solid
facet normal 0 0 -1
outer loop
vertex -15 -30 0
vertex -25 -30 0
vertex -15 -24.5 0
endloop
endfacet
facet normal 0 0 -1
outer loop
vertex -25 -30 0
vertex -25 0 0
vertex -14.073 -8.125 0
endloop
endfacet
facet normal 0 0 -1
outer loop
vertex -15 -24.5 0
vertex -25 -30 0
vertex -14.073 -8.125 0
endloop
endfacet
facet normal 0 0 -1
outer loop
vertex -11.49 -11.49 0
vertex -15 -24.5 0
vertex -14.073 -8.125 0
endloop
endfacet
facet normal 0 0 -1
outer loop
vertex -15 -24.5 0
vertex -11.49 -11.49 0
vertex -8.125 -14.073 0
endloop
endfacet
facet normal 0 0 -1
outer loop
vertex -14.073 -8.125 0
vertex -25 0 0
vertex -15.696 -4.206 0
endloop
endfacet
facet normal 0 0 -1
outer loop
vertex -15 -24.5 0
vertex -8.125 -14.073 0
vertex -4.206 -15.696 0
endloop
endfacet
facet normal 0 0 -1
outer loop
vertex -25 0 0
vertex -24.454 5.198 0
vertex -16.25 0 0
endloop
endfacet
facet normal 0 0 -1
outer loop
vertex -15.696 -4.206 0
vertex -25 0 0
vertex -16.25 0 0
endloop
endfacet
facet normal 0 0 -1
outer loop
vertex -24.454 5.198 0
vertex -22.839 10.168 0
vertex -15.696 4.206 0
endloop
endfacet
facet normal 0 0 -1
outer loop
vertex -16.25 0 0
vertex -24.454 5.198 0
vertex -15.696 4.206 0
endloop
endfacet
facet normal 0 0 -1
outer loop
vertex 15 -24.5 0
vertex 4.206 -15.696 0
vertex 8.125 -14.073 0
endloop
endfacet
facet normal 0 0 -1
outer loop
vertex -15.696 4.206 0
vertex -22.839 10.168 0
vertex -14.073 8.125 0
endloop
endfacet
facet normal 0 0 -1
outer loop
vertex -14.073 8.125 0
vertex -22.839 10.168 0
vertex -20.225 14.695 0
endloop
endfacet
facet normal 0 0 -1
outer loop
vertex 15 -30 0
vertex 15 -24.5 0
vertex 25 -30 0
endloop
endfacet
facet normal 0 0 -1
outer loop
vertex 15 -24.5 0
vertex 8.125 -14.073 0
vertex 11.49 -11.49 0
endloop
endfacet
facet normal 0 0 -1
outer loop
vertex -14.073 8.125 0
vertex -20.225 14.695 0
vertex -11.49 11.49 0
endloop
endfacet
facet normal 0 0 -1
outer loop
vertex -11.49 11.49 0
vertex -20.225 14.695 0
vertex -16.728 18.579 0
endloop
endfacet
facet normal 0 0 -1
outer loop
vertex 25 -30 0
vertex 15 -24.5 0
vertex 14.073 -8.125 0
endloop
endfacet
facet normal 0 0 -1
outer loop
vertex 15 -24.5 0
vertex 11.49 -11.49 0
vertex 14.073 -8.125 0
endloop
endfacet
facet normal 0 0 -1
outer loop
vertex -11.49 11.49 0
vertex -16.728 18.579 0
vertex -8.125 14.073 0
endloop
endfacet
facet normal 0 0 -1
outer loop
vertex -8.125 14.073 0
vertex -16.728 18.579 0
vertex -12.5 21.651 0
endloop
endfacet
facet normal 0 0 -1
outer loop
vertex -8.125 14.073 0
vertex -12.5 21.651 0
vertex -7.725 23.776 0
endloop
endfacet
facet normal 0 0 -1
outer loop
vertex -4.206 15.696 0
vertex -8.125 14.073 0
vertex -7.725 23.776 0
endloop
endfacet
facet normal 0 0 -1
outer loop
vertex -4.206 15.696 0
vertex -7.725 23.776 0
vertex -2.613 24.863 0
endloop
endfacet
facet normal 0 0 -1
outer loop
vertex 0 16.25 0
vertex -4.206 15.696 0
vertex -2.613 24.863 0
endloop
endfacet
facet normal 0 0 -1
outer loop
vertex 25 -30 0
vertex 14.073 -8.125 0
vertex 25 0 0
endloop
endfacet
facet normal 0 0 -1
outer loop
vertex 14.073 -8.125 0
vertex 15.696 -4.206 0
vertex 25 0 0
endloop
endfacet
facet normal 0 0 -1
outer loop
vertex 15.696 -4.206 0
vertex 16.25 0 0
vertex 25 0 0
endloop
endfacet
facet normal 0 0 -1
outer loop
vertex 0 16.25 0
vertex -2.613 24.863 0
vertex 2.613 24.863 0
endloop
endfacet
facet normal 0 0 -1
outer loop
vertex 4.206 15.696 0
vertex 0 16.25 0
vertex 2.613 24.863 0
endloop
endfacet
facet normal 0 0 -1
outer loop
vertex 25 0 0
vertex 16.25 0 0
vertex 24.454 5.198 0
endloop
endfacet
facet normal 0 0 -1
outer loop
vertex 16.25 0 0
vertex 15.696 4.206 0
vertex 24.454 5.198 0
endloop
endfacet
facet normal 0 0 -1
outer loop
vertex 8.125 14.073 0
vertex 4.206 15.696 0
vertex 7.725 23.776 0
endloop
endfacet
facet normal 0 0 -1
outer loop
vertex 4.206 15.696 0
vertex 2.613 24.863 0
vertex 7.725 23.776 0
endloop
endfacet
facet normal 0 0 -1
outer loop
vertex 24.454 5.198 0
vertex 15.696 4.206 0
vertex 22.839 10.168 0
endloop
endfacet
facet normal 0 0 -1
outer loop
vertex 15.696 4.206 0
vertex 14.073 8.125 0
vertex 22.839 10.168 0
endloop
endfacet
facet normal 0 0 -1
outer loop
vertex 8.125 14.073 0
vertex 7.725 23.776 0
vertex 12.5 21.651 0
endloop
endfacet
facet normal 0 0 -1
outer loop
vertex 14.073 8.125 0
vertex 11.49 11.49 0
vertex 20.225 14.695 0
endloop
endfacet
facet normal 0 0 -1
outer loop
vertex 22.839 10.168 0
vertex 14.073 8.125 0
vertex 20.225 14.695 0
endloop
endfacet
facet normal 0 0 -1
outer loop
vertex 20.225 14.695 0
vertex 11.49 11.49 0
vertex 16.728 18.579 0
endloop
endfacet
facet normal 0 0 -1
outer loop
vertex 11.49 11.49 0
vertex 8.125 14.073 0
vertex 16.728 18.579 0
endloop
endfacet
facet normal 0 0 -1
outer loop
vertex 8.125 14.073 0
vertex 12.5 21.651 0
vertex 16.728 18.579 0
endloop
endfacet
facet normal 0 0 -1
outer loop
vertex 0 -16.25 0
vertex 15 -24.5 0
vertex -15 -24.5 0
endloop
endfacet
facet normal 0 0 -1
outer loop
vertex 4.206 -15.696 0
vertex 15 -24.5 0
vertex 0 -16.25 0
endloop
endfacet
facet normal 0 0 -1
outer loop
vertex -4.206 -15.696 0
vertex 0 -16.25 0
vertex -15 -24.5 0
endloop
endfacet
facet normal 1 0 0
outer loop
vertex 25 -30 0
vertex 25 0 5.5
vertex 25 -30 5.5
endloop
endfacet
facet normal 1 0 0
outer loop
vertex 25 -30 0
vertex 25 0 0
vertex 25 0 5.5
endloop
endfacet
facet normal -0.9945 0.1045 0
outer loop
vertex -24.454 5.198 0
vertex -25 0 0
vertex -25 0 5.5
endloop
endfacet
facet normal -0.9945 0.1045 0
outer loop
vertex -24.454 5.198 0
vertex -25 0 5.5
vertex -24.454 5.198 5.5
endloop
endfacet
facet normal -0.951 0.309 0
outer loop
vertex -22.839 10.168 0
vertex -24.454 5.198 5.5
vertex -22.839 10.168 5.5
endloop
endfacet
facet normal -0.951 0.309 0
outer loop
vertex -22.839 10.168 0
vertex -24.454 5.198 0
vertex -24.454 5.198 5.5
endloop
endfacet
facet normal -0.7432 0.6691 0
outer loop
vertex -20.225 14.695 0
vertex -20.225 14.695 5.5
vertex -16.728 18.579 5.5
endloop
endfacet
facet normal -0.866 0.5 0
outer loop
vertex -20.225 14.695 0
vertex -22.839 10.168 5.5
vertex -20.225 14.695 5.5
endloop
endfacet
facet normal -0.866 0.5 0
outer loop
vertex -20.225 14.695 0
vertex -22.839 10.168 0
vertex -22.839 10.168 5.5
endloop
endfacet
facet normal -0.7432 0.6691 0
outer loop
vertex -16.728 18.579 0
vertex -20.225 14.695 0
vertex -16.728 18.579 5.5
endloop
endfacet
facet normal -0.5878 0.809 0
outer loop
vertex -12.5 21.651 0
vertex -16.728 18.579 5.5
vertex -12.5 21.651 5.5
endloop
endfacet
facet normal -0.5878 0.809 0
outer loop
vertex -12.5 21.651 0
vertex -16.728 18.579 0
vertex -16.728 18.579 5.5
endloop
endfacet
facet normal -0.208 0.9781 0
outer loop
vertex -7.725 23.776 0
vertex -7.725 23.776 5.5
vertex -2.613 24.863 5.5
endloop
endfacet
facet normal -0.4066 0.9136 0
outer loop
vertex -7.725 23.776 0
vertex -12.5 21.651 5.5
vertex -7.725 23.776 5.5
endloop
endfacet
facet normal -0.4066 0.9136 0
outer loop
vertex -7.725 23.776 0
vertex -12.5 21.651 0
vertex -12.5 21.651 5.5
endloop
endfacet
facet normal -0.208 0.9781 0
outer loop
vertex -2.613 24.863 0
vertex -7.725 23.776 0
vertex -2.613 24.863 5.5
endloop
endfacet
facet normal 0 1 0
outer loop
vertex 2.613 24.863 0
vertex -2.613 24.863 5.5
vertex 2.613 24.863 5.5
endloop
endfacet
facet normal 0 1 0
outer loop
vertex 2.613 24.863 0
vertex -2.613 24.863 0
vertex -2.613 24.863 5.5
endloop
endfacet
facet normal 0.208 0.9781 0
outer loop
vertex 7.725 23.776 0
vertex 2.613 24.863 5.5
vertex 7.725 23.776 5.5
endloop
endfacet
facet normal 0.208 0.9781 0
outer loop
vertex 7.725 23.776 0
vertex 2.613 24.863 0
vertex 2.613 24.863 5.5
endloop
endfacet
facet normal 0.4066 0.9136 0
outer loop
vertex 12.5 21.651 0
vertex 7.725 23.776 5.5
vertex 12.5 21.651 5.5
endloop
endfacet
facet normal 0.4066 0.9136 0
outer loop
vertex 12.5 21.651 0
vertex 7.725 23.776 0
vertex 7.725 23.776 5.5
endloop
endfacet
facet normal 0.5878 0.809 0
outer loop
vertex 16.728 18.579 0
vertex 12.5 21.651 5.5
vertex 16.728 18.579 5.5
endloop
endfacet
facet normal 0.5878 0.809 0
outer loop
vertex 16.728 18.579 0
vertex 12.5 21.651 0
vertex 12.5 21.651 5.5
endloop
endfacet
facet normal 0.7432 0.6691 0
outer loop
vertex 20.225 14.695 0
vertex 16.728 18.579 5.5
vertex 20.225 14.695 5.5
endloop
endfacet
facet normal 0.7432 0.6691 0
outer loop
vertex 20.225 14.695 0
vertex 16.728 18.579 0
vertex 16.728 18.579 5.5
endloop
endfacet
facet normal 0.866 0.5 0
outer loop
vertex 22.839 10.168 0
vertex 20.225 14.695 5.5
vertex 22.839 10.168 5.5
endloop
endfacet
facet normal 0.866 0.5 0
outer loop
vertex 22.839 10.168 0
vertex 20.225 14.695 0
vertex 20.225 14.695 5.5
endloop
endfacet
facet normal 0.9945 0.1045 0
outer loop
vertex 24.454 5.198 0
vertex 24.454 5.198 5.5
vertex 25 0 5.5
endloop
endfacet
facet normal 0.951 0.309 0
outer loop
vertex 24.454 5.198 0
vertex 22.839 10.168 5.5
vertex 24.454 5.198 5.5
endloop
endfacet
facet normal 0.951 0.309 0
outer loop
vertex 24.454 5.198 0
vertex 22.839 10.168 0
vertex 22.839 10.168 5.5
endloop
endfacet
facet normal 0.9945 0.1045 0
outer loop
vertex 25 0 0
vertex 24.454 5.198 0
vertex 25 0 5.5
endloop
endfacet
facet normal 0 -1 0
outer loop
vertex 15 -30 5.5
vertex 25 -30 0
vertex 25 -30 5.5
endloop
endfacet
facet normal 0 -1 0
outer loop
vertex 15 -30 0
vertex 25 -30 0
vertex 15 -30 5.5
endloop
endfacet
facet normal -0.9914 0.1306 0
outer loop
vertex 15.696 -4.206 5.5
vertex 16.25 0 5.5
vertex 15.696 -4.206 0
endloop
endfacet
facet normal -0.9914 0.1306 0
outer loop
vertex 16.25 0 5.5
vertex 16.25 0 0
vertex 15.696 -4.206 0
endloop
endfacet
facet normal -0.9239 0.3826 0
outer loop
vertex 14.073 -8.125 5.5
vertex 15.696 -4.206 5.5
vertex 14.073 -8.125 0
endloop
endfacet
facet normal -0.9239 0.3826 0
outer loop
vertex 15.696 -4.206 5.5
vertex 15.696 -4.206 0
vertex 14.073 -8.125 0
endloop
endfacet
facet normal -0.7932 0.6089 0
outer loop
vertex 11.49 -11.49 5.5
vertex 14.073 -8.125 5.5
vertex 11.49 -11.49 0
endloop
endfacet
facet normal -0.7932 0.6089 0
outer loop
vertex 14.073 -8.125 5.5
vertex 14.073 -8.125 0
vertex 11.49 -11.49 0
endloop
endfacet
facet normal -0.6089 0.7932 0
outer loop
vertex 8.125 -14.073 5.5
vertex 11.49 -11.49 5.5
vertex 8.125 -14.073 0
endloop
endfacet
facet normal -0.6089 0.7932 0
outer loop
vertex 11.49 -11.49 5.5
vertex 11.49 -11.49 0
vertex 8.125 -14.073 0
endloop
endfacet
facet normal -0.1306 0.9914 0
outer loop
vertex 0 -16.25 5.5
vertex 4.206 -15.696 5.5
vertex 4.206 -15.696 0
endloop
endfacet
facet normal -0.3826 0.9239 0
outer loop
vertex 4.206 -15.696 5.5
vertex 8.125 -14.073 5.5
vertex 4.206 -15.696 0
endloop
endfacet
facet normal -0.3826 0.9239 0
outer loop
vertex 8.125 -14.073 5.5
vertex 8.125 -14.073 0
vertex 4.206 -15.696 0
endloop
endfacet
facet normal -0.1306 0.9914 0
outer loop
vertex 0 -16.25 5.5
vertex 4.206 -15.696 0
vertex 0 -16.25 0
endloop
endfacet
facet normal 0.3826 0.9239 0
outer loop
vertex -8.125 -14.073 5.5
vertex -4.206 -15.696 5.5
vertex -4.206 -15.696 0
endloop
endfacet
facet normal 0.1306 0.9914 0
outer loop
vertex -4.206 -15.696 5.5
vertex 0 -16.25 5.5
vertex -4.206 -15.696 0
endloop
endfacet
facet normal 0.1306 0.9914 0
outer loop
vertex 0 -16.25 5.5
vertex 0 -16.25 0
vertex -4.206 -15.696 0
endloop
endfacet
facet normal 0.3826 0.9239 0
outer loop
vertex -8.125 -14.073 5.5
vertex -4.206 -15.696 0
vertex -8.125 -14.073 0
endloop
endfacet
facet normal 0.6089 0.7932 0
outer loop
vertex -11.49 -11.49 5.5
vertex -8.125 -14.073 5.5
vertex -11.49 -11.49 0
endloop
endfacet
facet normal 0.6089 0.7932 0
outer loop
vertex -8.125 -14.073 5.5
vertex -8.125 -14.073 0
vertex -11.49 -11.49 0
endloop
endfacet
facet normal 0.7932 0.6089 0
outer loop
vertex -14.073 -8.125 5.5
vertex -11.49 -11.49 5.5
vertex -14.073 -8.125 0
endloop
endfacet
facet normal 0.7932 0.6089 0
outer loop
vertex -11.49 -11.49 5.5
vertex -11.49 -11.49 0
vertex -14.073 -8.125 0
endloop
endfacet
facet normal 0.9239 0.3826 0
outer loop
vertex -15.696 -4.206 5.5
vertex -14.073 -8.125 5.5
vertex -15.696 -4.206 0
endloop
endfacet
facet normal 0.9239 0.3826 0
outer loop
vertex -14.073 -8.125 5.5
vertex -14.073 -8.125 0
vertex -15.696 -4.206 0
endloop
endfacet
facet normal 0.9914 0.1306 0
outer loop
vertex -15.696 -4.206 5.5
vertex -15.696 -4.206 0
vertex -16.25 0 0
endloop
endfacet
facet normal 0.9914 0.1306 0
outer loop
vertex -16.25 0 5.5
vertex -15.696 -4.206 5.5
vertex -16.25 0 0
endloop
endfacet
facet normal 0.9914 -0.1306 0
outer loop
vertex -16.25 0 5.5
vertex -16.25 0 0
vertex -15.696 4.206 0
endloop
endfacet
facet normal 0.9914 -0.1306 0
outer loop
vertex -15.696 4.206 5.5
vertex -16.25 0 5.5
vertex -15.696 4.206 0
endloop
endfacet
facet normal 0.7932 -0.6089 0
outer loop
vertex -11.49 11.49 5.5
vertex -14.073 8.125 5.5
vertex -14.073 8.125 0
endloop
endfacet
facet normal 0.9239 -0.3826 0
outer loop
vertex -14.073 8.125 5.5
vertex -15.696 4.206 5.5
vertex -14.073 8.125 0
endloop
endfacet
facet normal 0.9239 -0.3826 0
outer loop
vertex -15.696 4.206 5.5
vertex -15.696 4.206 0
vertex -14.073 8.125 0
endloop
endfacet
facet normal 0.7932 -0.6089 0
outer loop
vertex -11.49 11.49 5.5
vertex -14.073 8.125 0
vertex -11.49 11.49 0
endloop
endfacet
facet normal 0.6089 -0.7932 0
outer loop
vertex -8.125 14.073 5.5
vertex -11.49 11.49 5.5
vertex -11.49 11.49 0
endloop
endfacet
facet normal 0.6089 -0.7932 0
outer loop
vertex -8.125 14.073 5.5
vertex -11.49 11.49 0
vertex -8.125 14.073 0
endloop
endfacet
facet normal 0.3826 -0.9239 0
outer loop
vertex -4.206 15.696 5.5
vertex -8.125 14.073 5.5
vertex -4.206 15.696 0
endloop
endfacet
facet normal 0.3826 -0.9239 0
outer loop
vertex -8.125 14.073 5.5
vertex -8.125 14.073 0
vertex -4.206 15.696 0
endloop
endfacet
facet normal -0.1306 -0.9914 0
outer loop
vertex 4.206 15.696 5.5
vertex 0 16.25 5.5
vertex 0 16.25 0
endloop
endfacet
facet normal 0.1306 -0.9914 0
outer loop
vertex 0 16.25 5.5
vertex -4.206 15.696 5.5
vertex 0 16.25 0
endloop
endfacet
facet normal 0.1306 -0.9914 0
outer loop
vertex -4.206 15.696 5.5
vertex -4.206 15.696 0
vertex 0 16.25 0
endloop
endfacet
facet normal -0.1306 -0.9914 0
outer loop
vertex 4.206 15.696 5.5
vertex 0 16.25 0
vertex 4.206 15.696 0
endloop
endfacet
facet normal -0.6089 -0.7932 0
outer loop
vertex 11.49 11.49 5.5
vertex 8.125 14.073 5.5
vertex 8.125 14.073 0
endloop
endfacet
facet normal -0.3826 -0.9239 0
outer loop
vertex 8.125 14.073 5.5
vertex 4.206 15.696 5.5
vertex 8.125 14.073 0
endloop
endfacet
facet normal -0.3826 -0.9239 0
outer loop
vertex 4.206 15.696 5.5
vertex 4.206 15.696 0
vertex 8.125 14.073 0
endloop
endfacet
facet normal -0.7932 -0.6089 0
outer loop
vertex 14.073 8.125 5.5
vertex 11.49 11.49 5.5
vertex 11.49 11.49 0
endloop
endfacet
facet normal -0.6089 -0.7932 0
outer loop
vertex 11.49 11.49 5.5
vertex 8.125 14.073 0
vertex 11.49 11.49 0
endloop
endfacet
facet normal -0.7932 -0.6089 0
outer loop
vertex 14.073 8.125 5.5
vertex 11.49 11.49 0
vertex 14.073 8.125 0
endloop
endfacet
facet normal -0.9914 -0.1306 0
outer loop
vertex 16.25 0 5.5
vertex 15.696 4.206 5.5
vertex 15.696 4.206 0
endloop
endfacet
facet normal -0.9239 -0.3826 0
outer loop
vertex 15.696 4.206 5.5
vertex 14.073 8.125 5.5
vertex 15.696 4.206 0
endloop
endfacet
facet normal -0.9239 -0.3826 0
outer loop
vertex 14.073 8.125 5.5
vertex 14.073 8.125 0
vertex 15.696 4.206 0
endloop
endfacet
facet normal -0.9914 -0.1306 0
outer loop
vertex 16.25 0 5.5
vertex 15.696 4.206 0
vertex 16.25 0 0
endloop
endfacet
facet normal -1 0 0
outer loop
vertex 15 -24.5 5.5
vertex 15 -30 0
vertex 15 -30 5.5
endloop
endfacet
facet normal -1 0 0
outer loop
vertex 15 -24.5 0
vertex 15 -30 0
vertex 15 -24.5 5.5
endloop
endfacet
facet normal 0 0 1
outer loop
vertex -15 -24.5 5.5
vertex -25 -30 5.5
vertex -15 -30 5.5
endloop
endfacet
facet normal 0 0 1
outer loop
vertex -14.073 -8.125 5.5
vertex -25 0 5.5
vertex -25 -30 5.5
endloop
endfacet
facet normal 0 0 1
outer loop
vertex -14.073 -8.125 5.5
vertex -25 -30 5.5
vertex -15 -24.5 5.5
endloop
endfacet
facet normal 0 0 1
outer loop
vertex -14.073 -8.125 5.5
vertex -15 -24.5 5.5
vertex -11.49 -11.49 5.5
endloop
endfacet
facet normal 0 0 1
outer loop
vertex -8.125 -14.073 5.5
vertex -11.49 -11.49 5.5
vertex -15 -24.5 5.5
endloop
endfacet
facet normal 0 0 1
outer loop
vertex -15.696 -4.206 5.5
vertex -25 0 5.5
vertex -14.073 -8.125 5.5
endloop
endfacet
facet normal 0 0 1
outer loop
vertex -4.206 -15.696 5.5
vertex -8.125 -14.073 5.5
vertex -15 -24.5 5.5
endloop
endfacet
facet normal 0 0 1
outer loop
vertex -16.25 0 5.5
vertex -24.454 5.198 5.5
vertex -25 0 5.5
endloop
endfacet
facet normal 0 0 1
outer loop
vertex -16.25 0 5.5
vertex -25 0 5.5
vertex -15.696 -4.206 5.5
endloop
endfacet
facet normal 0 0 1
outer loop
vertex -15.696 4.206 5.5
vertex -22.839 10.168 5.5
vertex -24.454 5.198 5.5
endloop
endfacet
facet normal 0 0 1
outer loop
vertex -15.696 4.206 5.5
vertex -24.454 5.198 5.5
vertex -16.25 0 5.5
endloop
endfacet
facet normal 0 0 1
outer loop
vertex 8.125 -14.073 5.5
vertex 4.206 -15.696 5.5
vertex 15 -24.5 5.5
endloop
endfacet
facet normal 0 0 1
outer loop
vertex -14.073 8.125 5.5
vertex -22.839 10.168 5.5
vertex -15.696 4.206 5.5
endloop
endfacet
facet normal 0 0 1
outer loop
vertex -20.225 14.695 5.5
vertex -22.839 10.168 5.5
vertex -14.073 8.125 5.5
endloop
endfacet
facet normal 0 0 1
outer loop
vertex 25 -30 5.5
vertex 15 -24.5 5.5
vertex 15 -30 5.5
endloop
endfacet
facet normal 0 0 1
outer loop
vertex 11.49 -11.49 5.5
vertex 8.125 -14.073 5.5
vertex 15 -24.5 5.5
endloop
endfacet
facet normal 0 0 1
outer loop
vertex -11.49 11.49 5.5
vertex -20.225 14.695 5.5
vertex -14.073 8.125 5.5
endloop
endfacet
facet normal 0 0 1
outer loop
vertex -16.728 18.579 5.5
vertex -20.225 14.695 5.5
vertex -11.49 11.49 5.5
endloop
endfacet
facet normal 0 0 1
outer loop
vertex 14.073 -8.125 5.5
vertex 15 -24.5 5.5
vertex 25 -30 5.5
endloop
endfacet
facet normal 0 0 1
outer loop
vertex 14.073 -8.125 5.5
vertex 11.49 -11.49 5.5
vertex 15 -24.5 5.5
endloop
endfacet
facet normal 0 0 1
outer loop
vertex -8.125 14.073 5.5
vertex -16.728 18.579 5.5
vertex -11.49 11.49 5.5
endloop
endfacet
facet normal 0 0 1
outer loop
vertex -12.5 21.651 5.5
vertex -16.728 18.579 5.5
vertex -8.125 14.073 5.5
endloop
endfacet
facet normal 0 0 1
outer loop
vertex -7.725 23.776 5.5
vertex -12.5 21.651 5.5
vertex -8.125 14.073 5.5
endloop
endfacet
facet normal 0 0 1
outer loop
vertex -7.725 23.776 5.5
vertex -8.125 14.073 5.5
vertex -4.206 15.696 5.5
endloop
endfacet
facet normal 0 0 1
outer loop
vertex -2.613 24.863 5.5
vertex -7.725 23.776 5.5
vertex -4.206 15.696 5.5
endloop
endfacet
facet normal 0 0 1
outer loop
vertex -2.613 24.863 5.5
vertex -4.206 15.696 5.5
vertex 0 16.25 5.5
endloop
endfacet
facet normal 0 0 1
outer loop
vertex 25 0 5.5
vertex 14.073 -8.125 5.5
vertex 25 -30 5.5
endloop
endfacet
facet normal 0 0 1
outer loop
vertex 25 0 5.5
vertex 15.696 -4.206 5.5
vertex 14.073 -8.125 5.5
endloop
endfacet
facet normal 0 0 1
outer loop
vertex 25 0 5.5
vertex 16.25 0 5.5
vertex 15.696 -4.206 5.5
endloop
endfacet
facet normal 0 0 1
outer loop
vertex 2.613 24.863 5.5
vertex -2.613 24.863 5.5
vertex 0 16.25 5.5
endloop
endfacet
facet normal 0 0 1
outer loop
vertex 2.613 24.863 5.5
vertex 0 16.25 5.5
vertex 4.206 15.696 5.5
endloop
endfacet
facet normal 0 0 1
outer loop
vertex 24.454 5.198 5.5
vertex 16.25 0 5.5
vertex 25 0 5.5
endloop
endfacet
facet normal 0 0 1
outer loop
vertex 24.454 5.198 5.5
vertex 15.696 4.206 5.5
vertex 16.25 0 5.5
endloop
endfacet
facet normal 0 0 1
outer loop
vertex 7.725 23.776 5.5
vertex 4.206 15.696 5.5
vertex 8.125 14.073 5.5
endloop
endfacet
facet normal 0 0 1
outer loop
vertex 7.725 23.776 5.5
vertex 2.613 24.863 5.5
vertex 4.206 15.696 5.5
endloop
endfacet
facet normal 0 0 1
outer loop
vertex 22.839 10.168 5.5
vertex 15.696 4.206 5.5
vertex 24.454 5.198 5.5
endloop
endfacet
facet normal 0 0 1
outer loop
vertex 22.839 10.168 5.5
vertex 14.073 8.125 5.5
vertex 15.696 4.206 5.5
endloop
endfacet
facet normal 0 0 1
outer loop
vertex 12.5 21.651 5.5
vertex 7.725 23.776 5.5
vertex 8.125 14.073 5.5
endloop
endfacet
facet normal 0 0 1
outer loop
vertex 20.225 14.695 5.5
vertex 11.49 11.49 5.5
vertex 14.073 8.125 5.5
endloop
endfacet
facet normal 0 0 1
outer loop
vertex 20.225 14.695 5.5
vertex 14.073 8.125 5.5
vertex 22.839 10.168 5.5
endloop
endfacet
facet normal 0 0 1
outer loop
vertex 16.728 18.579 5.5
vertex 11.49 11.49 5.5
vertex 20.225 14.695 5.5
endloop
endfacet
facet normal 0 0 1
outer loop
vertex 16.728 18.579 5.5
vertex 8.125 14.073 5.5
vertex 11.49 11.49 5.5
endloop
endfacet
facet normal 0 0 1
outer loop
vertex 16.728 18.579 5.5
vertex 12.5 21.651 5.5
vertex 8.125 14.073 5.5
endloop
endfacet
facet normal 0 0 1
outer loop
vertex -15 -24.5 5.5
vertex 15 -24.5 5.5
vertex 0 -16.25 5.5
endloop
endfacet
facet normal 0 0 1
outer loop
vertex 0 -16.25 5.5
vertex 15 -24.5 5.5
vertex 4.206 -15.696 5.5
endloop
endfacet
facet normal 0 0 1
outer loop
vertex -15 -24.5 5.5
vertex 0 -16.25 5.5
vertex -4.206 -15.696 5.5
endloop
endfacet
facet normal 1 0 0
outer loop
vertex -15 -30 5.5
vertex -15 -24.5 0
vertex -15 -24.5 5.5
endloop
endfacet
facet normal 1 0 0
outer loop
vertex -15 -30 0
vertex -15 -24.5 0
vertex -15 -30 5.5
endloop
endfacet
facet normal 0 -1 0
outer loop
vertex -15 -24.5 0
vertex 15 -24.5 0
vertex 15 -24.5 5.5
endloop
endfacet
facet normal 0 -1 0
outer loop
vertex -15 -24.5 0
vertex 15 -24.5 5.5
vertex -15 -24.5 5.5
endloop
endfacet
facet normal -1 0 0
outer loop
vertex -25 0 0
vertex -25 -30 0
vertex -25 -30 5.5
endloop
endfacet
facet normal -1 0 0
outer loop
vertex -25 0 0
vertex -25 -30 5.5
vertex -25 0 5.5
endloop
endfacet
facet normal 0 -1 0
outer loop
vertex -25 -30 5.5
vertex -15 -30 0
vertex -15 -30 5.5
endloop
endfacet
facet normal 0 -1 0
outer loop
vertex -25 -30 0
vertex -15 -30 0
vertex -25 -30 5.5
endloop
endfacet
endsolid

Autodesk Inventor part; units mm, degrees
ref_plane "YZ Plane" through (0, 0, 0) normal (1, 0, 0) x (0, 1, 0)
ref_plane "XZ Plane" through (0, 0, 0) normal (0, 1, 0) x (-1, 0, 0)
ref_plane "XY Plane" through (0, 0, 0) normal (0, 0, 1) x (1, 0, 0)
sketch "スケッチ1" plane through (0, 0, 0) normal (0, 0, 1) x (1, 0, 0)
  circle A0 centre (0, 0) radius 16.25
  line L0 (-25, 30.5) -> (25, 30.5)
  line L1 (25, 30.5) -> (25, -24.5)
  line L2 (25, -24.5) -> (-25, -24.5)
  line L3 (-25, -24.5) -> (-25, 30.5)
  line L4 (-25, -24.5) -> (-15, -24.5)
  line L5 (-15, -24.5) -> (-15, -30)
  line L6 (-15, -30) -> (-25, -30)
  line L7 (-25, -30) -> (-25, -24.5)
  line L8 (15, -24.5) -> (25, -24.5)
  line L9 (25, -24.5) -> (25, -30)
  line L10 (25, -30) -> (15, -30)
  line L11 (15, -30) -> (15, -24.5)
  circle A1 centre (0, 0) radius 25
  point P0 (0, 30.5)
  point P1 (-15, -24.5)
  point P2 (-25, 0)
  point P3 (25, 0)
  dimension "d0" = 32.5
  dimension "d1" = 24.5
  dimension "d2" = 50
  dimension "d3" = 55
  dimension "d6" = 5.5
  dimension "d7" = 10
extrude "押し出し1" add sketch "スケッチ1" along normal blind 5.5 contours A1 L2 L3 | A1 L2 | L1 L2 A1 | L2 L5 L6 L7 | L9 L10 L11 L2 picked at (-0.6529, -21.7105)
properties part number "motor_setter_front" material "木材 (カエデ材)"
